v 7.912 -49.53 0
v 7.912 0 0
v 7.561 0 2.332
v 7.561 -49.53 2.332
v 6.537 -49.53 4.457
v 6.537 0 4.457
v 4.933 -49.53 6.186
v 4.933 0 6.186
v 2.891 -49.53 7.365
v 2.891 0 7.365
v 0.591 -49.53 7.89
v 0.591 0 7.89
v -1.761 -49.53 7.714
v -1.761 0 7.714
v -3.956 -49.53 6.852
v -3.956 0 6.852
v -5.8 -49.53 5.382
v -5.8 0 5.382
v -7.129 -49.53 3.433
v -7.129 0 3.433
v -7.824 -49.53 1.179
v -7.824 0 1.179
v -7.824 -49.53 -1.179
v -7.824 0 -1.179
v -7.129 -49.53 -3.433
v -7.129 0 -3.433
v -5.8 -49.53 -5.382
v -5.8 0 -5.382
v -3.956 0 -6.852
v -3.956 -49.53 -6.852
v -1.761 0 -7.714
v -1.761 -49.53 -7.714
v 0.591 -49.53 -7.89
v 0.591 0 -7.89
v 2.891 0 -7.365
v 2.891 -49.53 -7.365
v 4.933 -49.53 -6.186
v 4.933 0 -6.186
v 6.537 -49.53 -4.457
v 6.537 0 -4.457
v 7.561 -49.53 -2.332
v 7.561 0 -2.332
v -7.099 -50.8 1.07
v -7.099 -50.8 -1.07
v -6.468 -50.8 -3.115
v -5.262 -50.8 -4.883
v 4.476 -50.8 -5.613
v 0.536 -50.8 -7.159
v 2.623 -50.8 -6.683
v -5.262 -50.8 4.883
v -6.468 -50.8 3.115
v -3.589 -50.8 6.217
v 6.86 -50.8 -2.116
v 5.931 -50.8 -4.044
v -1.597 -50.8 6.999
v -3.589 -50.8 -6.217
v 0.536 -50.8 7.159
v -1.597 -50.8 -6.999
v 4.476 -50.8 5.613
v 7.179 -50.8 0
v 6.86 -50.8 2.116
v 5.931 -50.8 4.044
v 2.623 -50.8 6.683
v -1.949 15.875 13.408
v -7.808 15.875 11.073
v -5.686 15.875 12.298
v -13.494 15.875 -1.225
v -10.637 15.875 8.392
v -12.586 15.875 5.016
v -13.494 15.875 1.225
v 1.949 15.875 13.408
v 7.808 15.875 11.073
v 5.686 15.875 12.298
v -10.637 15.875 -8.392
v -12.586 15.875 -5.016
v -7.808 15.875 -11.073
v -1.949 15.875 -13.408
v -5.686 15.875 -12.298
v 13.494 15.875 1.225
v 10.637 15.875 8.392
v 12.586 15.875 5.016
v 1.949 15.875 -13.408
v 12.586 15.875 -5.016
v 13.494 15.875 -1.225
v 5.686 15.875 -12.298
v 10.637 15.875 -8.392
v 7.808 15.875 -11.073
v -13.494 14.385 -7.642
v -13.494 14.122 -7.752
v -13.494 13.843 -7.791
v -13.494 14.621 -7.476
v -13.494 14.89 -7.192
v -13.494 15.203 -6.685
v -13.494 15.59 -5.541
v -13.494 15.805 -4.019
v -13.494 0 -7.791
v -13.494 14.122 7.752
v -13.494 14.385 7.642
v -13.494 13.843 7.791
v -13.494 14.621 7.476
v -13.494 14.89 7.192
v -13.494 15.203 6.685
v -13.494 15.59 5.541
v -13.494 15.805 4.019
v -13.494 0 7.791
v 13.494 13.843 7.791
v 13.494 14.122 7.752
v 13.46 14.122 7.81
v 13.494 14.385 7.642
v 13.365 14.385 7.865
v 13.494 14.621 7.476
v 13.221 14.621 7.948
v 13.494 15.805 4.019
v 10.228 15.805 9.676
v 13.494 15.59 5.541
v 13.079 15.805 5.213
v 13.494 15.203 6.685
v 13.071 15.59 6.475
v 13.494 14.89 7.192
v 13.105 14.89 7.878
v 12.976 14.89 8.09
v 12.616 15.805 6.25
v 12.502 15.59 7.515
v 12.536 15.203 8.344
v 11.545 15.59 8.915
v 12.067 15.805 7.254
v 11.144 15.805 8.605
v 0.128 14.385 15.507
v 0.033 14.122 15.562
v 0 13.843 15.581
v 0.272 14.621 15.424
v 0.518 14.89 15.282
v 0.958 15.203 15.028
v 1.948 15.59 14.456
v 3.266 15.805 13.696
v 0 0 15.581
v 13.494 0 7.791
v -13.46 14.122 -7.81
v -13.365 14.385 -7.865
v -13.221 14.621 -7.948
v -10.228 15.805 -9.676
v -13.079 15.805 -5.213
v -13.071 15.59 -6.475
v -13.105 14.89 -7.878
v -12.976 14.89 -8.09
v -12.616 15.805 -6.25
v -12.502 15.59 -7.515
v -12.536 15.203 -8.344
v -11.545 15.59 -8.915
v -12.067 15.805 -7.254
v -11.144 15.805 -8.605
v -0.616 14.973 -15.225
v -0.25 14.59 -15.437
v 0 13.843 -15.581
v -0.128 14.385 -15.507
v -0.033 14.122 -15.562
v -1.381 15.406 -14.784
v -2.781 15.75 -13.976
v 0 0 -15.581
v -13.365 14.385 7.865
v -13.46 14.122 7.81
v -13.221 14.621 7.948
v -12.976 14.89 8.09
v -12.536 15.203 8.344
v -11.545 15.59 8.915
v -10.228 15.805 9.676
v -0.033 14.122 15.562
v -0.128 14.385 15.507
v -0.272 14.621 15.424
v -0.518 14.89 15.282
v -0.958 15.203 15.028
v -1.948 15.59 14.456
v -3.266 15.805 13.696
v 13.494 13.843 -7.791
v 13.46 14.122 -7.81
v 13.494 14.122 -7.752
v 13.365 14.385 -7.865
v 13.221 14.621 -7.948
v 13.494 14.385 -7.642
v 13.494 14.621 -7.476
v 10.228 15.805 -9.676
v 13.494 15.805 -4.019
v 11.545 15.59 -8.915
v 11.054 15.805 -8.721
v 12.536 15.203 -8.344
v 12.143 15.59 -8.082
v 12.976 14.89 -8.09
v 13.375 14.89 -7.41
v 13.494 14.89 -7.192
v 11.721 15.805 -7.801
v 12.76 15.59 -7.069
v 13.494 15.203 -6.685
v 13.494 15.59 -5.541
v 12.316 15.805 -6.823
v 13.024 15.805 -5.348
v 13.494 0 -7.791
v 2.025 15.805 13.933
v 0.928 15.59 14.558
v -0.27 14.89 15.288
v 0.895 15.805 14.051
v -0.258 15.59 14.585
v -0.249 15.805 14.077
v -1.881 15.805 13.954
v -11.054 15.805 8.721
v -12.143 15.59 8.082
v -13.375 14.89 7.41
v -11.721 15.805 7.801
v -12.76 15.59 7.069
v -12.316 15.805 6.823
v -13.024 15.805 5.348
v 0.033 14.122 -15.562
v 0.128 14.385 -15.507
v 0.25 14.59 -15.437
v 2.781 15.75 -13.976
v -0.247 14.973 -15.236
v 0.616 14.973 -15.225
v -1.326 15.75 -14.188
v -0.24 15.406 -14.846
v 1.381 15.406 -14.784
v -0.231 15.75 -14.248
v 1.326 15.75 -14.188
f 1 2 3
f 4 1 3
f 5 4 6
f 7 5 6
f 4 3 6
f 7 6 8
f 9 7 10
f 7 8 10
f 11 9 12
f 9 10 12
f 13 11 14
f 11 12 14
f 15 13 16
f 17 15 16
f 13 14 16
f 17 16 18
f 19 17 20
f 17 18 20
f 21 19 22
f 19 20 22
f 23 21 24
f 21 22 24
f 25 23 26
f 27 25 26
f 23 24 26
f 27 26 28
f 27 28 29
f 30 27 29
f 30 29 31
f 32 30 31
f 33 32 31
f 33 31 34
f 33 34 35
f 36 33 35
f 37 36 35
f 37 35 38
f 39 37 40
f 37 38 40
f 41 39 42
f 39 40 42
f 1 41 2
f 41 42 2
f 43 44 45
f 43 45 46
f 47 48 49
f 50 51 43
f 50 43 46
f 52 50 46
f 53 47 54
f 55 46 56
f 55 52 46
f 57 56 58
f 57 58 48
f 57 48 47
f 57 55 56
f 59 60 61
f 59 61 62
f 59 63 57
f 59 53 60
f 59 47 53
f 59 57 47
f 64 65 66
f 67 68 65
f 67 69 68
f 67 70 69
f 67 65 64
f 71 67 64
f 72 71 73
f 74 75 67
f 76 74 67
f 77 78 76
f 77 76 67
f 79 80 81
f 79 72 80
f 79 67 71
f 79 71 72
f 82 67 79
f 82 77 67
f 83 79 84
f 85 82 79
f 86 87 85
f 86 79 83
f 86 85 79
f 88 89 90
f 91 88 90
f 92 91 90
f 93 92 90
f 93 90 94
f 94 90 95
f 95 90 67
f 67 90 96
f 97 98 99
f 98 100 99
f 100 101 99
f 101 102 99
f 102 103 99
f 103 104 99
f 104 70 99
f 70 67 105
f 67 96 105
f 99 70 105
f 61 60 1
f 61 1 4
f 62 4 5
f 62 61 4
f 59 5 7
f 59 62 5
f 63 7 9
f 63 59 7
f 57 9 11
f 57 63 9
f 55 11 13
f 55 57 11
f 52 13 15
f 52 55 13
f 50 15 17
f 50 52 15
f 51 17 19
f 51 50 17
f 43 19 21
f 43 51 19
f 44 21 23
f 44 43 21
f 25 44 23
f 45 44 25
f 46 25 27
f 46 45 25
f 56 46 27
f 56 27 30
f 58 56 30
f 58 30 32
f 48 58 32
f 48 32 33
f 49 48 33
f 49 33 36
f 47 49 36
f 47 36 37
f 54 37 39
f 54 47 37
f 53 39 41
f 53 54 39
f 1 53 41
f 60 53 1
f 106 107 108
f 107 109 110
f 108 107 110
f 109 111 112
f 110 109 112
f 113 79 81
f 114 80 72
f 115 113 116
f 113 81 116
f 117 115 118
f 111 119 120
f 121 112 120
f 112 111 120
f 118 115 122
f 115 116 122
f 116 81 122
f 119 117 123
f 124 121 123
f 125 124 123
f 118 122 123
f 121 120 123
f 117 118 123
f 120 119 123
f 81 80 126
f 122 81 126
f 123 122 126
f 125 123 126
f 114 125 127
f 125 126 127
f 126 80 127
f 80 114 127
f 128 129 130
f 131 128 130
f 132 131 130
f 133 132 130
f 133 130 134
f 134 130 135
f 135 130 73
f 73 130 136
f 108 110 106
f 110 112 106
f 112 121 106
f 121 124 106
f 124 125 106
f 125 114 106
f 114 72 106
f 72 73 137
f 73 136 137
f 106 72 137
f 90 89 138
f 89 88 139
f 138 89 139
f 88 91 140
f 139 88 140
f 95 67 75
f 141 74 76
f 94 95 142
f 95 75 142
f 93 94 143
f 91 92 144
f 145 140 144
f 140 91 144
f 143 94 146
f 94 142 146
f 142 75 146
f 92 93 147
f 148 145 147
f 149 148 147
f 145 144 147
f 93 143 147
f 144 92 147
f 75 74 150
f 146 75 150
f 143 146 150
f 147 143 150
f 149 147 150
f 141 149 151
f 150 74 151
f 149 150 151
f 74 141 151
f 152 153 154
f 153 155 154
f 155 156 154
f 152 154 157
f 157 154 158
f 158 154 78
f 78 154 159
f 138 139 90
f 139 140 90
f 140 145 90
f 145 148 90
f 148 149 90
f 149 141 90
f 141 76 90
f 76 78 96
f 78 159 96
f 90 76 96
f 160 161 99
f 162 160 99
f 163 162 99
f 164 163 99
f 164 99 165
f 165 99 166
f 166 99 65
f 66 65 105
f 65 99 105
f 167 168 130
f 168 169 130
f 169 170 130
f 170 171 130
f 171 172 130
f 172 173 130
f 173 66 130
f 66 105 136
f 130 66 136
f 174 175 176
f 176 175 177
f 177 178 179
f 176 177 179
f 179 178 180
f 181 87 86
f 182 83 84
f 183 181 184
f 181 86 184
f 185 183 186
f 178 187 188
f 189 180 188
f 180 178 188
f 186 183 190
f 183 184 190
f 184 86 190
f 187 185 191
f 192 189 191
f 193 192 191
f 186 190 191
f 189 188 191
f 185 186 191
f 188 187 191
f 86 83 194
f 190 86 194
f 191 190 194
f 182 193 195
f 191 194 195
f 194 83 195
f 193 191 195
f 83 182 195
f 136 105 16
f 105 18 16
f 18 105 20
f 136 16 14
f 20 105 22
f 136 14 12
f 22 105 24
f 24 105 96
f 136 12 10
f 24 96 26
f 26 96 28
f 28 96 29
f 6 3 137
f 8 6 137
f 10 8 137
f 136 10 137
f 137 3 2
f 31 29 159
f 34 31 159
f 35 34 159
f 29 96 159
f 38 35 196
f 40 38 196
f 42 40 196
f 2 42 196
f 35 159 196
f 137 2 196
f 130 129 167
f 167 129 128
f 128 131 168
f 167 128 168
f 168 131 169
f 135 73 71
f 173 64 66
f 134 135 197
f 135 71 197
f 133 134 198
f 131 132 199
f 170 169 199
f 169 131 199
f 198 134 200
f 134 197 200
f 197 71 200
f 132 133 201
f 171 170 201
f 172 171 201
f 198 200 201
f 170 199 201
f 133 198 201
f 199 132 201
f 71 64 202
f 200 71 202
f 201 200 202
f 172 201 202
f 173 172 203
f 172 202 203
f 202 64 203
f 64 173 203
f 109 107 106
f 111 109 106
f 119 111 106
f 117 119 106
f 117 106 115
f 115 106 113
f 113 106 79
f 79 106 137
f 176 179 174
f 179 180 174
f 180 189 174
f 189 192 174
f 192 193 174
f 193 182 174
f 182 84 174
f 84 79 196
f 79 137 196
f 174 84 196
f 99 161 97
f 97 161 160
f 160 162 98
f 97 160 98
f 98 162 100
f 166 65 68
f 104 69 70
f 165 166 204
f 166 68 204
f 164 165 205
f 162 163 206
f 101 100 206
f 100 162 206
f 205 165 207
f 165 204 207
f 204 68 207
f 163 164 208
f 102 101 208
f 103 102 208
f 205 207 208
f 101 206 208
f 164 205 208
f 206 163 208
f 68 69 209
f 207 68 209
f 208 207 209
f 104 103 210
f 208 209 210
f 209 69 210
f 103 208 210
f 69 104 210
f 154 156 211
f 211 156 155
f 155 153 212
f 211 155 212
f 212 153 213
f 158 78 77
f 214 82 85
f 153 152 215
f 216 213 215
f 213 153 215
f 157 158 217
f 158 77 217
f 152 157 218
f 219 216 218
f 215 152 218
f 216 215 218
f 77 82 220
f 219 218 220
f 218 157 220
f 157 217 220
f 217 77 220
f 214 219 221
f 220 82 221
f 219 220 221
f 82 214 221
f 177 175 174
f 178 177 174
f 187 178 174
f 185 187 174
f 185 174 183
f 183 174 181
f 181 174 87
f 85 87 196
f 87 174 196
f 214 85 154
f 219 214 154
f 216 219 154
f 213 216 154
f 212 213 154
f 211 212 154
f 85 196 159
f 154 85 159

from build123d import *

# Parameters (mm, degrees)
BOSS_EXTRUDE1_DEPTH = 15.875
SKETCH6_R           = 7.9121
BOSS_EXTRUDE2_DEPTH = 50.8
CHAMFER1_SIZE       = 1.27
CHAMFER1_SIZE2      = 0.733234842


with BuildPart() as part:
    # Sketch1 → Boss-Extrude1 (new body)
    with BuildSketch(Plane(origin=(0, 0, 0), x_dir=(1, 0, 0), z_dir=(0, 1, 0))):
        Polygon((0, -15.58124039), (13.49375, -7.790620195), (13.49375, 7.790620195), (0, 15.58124039), (-13.49375, 7.790620195), (-13.49375, -7.790620195), align=None)
    extrude(amount=BOSS_EXTRUDE1_DEPTH)

    # Sketch2 → Cut-Revolve1 (revolve, cut)
    with BuildSketch(Plane(origin=(0, 0, 0), x_dir=(0, 0, -1), z_dir=(1, 0, 0))):
        with BuildLine():
            Line((13.54924039, 15.875), (15.58124039, 15.875))
            Line((15.58124039, 15.875), (15.58124039, 13.843))
            ThreePointArc((15.58124039, 13.843), (14.986081369, 15.279840979), (13.54924039, 15.875))
        make_face()
    revolve(axis=Axis((0, 15.875, 0), (0, -1, 0)), mode=Mode.SUBTRACT)

    # Sketch6 → Boss-Extrude2 (add)
    with BuildSketch(Plane.XZ):
        Circle(SKETCH6_R)
    extrude(amount=BOSS_EXTRUDE2_DEPTH)

    # Chamfer1
    chamfer1_edges = [part.edges().sort_by_distance(p)[0] for p in [
        (-7.9121, -50.8, 0),
    ]]
    chamfer1_side = [part.faces().sort_by_distance(p)[0] for p in [
        (-7.9121, -25.4, 0),
    ]]
    chamfer(chamfer1_edges, length=CHAMFER1_SIZE, length2=CHAMFER1_SIZE2, reference=chamfer1_side[0])


solid = part.part
